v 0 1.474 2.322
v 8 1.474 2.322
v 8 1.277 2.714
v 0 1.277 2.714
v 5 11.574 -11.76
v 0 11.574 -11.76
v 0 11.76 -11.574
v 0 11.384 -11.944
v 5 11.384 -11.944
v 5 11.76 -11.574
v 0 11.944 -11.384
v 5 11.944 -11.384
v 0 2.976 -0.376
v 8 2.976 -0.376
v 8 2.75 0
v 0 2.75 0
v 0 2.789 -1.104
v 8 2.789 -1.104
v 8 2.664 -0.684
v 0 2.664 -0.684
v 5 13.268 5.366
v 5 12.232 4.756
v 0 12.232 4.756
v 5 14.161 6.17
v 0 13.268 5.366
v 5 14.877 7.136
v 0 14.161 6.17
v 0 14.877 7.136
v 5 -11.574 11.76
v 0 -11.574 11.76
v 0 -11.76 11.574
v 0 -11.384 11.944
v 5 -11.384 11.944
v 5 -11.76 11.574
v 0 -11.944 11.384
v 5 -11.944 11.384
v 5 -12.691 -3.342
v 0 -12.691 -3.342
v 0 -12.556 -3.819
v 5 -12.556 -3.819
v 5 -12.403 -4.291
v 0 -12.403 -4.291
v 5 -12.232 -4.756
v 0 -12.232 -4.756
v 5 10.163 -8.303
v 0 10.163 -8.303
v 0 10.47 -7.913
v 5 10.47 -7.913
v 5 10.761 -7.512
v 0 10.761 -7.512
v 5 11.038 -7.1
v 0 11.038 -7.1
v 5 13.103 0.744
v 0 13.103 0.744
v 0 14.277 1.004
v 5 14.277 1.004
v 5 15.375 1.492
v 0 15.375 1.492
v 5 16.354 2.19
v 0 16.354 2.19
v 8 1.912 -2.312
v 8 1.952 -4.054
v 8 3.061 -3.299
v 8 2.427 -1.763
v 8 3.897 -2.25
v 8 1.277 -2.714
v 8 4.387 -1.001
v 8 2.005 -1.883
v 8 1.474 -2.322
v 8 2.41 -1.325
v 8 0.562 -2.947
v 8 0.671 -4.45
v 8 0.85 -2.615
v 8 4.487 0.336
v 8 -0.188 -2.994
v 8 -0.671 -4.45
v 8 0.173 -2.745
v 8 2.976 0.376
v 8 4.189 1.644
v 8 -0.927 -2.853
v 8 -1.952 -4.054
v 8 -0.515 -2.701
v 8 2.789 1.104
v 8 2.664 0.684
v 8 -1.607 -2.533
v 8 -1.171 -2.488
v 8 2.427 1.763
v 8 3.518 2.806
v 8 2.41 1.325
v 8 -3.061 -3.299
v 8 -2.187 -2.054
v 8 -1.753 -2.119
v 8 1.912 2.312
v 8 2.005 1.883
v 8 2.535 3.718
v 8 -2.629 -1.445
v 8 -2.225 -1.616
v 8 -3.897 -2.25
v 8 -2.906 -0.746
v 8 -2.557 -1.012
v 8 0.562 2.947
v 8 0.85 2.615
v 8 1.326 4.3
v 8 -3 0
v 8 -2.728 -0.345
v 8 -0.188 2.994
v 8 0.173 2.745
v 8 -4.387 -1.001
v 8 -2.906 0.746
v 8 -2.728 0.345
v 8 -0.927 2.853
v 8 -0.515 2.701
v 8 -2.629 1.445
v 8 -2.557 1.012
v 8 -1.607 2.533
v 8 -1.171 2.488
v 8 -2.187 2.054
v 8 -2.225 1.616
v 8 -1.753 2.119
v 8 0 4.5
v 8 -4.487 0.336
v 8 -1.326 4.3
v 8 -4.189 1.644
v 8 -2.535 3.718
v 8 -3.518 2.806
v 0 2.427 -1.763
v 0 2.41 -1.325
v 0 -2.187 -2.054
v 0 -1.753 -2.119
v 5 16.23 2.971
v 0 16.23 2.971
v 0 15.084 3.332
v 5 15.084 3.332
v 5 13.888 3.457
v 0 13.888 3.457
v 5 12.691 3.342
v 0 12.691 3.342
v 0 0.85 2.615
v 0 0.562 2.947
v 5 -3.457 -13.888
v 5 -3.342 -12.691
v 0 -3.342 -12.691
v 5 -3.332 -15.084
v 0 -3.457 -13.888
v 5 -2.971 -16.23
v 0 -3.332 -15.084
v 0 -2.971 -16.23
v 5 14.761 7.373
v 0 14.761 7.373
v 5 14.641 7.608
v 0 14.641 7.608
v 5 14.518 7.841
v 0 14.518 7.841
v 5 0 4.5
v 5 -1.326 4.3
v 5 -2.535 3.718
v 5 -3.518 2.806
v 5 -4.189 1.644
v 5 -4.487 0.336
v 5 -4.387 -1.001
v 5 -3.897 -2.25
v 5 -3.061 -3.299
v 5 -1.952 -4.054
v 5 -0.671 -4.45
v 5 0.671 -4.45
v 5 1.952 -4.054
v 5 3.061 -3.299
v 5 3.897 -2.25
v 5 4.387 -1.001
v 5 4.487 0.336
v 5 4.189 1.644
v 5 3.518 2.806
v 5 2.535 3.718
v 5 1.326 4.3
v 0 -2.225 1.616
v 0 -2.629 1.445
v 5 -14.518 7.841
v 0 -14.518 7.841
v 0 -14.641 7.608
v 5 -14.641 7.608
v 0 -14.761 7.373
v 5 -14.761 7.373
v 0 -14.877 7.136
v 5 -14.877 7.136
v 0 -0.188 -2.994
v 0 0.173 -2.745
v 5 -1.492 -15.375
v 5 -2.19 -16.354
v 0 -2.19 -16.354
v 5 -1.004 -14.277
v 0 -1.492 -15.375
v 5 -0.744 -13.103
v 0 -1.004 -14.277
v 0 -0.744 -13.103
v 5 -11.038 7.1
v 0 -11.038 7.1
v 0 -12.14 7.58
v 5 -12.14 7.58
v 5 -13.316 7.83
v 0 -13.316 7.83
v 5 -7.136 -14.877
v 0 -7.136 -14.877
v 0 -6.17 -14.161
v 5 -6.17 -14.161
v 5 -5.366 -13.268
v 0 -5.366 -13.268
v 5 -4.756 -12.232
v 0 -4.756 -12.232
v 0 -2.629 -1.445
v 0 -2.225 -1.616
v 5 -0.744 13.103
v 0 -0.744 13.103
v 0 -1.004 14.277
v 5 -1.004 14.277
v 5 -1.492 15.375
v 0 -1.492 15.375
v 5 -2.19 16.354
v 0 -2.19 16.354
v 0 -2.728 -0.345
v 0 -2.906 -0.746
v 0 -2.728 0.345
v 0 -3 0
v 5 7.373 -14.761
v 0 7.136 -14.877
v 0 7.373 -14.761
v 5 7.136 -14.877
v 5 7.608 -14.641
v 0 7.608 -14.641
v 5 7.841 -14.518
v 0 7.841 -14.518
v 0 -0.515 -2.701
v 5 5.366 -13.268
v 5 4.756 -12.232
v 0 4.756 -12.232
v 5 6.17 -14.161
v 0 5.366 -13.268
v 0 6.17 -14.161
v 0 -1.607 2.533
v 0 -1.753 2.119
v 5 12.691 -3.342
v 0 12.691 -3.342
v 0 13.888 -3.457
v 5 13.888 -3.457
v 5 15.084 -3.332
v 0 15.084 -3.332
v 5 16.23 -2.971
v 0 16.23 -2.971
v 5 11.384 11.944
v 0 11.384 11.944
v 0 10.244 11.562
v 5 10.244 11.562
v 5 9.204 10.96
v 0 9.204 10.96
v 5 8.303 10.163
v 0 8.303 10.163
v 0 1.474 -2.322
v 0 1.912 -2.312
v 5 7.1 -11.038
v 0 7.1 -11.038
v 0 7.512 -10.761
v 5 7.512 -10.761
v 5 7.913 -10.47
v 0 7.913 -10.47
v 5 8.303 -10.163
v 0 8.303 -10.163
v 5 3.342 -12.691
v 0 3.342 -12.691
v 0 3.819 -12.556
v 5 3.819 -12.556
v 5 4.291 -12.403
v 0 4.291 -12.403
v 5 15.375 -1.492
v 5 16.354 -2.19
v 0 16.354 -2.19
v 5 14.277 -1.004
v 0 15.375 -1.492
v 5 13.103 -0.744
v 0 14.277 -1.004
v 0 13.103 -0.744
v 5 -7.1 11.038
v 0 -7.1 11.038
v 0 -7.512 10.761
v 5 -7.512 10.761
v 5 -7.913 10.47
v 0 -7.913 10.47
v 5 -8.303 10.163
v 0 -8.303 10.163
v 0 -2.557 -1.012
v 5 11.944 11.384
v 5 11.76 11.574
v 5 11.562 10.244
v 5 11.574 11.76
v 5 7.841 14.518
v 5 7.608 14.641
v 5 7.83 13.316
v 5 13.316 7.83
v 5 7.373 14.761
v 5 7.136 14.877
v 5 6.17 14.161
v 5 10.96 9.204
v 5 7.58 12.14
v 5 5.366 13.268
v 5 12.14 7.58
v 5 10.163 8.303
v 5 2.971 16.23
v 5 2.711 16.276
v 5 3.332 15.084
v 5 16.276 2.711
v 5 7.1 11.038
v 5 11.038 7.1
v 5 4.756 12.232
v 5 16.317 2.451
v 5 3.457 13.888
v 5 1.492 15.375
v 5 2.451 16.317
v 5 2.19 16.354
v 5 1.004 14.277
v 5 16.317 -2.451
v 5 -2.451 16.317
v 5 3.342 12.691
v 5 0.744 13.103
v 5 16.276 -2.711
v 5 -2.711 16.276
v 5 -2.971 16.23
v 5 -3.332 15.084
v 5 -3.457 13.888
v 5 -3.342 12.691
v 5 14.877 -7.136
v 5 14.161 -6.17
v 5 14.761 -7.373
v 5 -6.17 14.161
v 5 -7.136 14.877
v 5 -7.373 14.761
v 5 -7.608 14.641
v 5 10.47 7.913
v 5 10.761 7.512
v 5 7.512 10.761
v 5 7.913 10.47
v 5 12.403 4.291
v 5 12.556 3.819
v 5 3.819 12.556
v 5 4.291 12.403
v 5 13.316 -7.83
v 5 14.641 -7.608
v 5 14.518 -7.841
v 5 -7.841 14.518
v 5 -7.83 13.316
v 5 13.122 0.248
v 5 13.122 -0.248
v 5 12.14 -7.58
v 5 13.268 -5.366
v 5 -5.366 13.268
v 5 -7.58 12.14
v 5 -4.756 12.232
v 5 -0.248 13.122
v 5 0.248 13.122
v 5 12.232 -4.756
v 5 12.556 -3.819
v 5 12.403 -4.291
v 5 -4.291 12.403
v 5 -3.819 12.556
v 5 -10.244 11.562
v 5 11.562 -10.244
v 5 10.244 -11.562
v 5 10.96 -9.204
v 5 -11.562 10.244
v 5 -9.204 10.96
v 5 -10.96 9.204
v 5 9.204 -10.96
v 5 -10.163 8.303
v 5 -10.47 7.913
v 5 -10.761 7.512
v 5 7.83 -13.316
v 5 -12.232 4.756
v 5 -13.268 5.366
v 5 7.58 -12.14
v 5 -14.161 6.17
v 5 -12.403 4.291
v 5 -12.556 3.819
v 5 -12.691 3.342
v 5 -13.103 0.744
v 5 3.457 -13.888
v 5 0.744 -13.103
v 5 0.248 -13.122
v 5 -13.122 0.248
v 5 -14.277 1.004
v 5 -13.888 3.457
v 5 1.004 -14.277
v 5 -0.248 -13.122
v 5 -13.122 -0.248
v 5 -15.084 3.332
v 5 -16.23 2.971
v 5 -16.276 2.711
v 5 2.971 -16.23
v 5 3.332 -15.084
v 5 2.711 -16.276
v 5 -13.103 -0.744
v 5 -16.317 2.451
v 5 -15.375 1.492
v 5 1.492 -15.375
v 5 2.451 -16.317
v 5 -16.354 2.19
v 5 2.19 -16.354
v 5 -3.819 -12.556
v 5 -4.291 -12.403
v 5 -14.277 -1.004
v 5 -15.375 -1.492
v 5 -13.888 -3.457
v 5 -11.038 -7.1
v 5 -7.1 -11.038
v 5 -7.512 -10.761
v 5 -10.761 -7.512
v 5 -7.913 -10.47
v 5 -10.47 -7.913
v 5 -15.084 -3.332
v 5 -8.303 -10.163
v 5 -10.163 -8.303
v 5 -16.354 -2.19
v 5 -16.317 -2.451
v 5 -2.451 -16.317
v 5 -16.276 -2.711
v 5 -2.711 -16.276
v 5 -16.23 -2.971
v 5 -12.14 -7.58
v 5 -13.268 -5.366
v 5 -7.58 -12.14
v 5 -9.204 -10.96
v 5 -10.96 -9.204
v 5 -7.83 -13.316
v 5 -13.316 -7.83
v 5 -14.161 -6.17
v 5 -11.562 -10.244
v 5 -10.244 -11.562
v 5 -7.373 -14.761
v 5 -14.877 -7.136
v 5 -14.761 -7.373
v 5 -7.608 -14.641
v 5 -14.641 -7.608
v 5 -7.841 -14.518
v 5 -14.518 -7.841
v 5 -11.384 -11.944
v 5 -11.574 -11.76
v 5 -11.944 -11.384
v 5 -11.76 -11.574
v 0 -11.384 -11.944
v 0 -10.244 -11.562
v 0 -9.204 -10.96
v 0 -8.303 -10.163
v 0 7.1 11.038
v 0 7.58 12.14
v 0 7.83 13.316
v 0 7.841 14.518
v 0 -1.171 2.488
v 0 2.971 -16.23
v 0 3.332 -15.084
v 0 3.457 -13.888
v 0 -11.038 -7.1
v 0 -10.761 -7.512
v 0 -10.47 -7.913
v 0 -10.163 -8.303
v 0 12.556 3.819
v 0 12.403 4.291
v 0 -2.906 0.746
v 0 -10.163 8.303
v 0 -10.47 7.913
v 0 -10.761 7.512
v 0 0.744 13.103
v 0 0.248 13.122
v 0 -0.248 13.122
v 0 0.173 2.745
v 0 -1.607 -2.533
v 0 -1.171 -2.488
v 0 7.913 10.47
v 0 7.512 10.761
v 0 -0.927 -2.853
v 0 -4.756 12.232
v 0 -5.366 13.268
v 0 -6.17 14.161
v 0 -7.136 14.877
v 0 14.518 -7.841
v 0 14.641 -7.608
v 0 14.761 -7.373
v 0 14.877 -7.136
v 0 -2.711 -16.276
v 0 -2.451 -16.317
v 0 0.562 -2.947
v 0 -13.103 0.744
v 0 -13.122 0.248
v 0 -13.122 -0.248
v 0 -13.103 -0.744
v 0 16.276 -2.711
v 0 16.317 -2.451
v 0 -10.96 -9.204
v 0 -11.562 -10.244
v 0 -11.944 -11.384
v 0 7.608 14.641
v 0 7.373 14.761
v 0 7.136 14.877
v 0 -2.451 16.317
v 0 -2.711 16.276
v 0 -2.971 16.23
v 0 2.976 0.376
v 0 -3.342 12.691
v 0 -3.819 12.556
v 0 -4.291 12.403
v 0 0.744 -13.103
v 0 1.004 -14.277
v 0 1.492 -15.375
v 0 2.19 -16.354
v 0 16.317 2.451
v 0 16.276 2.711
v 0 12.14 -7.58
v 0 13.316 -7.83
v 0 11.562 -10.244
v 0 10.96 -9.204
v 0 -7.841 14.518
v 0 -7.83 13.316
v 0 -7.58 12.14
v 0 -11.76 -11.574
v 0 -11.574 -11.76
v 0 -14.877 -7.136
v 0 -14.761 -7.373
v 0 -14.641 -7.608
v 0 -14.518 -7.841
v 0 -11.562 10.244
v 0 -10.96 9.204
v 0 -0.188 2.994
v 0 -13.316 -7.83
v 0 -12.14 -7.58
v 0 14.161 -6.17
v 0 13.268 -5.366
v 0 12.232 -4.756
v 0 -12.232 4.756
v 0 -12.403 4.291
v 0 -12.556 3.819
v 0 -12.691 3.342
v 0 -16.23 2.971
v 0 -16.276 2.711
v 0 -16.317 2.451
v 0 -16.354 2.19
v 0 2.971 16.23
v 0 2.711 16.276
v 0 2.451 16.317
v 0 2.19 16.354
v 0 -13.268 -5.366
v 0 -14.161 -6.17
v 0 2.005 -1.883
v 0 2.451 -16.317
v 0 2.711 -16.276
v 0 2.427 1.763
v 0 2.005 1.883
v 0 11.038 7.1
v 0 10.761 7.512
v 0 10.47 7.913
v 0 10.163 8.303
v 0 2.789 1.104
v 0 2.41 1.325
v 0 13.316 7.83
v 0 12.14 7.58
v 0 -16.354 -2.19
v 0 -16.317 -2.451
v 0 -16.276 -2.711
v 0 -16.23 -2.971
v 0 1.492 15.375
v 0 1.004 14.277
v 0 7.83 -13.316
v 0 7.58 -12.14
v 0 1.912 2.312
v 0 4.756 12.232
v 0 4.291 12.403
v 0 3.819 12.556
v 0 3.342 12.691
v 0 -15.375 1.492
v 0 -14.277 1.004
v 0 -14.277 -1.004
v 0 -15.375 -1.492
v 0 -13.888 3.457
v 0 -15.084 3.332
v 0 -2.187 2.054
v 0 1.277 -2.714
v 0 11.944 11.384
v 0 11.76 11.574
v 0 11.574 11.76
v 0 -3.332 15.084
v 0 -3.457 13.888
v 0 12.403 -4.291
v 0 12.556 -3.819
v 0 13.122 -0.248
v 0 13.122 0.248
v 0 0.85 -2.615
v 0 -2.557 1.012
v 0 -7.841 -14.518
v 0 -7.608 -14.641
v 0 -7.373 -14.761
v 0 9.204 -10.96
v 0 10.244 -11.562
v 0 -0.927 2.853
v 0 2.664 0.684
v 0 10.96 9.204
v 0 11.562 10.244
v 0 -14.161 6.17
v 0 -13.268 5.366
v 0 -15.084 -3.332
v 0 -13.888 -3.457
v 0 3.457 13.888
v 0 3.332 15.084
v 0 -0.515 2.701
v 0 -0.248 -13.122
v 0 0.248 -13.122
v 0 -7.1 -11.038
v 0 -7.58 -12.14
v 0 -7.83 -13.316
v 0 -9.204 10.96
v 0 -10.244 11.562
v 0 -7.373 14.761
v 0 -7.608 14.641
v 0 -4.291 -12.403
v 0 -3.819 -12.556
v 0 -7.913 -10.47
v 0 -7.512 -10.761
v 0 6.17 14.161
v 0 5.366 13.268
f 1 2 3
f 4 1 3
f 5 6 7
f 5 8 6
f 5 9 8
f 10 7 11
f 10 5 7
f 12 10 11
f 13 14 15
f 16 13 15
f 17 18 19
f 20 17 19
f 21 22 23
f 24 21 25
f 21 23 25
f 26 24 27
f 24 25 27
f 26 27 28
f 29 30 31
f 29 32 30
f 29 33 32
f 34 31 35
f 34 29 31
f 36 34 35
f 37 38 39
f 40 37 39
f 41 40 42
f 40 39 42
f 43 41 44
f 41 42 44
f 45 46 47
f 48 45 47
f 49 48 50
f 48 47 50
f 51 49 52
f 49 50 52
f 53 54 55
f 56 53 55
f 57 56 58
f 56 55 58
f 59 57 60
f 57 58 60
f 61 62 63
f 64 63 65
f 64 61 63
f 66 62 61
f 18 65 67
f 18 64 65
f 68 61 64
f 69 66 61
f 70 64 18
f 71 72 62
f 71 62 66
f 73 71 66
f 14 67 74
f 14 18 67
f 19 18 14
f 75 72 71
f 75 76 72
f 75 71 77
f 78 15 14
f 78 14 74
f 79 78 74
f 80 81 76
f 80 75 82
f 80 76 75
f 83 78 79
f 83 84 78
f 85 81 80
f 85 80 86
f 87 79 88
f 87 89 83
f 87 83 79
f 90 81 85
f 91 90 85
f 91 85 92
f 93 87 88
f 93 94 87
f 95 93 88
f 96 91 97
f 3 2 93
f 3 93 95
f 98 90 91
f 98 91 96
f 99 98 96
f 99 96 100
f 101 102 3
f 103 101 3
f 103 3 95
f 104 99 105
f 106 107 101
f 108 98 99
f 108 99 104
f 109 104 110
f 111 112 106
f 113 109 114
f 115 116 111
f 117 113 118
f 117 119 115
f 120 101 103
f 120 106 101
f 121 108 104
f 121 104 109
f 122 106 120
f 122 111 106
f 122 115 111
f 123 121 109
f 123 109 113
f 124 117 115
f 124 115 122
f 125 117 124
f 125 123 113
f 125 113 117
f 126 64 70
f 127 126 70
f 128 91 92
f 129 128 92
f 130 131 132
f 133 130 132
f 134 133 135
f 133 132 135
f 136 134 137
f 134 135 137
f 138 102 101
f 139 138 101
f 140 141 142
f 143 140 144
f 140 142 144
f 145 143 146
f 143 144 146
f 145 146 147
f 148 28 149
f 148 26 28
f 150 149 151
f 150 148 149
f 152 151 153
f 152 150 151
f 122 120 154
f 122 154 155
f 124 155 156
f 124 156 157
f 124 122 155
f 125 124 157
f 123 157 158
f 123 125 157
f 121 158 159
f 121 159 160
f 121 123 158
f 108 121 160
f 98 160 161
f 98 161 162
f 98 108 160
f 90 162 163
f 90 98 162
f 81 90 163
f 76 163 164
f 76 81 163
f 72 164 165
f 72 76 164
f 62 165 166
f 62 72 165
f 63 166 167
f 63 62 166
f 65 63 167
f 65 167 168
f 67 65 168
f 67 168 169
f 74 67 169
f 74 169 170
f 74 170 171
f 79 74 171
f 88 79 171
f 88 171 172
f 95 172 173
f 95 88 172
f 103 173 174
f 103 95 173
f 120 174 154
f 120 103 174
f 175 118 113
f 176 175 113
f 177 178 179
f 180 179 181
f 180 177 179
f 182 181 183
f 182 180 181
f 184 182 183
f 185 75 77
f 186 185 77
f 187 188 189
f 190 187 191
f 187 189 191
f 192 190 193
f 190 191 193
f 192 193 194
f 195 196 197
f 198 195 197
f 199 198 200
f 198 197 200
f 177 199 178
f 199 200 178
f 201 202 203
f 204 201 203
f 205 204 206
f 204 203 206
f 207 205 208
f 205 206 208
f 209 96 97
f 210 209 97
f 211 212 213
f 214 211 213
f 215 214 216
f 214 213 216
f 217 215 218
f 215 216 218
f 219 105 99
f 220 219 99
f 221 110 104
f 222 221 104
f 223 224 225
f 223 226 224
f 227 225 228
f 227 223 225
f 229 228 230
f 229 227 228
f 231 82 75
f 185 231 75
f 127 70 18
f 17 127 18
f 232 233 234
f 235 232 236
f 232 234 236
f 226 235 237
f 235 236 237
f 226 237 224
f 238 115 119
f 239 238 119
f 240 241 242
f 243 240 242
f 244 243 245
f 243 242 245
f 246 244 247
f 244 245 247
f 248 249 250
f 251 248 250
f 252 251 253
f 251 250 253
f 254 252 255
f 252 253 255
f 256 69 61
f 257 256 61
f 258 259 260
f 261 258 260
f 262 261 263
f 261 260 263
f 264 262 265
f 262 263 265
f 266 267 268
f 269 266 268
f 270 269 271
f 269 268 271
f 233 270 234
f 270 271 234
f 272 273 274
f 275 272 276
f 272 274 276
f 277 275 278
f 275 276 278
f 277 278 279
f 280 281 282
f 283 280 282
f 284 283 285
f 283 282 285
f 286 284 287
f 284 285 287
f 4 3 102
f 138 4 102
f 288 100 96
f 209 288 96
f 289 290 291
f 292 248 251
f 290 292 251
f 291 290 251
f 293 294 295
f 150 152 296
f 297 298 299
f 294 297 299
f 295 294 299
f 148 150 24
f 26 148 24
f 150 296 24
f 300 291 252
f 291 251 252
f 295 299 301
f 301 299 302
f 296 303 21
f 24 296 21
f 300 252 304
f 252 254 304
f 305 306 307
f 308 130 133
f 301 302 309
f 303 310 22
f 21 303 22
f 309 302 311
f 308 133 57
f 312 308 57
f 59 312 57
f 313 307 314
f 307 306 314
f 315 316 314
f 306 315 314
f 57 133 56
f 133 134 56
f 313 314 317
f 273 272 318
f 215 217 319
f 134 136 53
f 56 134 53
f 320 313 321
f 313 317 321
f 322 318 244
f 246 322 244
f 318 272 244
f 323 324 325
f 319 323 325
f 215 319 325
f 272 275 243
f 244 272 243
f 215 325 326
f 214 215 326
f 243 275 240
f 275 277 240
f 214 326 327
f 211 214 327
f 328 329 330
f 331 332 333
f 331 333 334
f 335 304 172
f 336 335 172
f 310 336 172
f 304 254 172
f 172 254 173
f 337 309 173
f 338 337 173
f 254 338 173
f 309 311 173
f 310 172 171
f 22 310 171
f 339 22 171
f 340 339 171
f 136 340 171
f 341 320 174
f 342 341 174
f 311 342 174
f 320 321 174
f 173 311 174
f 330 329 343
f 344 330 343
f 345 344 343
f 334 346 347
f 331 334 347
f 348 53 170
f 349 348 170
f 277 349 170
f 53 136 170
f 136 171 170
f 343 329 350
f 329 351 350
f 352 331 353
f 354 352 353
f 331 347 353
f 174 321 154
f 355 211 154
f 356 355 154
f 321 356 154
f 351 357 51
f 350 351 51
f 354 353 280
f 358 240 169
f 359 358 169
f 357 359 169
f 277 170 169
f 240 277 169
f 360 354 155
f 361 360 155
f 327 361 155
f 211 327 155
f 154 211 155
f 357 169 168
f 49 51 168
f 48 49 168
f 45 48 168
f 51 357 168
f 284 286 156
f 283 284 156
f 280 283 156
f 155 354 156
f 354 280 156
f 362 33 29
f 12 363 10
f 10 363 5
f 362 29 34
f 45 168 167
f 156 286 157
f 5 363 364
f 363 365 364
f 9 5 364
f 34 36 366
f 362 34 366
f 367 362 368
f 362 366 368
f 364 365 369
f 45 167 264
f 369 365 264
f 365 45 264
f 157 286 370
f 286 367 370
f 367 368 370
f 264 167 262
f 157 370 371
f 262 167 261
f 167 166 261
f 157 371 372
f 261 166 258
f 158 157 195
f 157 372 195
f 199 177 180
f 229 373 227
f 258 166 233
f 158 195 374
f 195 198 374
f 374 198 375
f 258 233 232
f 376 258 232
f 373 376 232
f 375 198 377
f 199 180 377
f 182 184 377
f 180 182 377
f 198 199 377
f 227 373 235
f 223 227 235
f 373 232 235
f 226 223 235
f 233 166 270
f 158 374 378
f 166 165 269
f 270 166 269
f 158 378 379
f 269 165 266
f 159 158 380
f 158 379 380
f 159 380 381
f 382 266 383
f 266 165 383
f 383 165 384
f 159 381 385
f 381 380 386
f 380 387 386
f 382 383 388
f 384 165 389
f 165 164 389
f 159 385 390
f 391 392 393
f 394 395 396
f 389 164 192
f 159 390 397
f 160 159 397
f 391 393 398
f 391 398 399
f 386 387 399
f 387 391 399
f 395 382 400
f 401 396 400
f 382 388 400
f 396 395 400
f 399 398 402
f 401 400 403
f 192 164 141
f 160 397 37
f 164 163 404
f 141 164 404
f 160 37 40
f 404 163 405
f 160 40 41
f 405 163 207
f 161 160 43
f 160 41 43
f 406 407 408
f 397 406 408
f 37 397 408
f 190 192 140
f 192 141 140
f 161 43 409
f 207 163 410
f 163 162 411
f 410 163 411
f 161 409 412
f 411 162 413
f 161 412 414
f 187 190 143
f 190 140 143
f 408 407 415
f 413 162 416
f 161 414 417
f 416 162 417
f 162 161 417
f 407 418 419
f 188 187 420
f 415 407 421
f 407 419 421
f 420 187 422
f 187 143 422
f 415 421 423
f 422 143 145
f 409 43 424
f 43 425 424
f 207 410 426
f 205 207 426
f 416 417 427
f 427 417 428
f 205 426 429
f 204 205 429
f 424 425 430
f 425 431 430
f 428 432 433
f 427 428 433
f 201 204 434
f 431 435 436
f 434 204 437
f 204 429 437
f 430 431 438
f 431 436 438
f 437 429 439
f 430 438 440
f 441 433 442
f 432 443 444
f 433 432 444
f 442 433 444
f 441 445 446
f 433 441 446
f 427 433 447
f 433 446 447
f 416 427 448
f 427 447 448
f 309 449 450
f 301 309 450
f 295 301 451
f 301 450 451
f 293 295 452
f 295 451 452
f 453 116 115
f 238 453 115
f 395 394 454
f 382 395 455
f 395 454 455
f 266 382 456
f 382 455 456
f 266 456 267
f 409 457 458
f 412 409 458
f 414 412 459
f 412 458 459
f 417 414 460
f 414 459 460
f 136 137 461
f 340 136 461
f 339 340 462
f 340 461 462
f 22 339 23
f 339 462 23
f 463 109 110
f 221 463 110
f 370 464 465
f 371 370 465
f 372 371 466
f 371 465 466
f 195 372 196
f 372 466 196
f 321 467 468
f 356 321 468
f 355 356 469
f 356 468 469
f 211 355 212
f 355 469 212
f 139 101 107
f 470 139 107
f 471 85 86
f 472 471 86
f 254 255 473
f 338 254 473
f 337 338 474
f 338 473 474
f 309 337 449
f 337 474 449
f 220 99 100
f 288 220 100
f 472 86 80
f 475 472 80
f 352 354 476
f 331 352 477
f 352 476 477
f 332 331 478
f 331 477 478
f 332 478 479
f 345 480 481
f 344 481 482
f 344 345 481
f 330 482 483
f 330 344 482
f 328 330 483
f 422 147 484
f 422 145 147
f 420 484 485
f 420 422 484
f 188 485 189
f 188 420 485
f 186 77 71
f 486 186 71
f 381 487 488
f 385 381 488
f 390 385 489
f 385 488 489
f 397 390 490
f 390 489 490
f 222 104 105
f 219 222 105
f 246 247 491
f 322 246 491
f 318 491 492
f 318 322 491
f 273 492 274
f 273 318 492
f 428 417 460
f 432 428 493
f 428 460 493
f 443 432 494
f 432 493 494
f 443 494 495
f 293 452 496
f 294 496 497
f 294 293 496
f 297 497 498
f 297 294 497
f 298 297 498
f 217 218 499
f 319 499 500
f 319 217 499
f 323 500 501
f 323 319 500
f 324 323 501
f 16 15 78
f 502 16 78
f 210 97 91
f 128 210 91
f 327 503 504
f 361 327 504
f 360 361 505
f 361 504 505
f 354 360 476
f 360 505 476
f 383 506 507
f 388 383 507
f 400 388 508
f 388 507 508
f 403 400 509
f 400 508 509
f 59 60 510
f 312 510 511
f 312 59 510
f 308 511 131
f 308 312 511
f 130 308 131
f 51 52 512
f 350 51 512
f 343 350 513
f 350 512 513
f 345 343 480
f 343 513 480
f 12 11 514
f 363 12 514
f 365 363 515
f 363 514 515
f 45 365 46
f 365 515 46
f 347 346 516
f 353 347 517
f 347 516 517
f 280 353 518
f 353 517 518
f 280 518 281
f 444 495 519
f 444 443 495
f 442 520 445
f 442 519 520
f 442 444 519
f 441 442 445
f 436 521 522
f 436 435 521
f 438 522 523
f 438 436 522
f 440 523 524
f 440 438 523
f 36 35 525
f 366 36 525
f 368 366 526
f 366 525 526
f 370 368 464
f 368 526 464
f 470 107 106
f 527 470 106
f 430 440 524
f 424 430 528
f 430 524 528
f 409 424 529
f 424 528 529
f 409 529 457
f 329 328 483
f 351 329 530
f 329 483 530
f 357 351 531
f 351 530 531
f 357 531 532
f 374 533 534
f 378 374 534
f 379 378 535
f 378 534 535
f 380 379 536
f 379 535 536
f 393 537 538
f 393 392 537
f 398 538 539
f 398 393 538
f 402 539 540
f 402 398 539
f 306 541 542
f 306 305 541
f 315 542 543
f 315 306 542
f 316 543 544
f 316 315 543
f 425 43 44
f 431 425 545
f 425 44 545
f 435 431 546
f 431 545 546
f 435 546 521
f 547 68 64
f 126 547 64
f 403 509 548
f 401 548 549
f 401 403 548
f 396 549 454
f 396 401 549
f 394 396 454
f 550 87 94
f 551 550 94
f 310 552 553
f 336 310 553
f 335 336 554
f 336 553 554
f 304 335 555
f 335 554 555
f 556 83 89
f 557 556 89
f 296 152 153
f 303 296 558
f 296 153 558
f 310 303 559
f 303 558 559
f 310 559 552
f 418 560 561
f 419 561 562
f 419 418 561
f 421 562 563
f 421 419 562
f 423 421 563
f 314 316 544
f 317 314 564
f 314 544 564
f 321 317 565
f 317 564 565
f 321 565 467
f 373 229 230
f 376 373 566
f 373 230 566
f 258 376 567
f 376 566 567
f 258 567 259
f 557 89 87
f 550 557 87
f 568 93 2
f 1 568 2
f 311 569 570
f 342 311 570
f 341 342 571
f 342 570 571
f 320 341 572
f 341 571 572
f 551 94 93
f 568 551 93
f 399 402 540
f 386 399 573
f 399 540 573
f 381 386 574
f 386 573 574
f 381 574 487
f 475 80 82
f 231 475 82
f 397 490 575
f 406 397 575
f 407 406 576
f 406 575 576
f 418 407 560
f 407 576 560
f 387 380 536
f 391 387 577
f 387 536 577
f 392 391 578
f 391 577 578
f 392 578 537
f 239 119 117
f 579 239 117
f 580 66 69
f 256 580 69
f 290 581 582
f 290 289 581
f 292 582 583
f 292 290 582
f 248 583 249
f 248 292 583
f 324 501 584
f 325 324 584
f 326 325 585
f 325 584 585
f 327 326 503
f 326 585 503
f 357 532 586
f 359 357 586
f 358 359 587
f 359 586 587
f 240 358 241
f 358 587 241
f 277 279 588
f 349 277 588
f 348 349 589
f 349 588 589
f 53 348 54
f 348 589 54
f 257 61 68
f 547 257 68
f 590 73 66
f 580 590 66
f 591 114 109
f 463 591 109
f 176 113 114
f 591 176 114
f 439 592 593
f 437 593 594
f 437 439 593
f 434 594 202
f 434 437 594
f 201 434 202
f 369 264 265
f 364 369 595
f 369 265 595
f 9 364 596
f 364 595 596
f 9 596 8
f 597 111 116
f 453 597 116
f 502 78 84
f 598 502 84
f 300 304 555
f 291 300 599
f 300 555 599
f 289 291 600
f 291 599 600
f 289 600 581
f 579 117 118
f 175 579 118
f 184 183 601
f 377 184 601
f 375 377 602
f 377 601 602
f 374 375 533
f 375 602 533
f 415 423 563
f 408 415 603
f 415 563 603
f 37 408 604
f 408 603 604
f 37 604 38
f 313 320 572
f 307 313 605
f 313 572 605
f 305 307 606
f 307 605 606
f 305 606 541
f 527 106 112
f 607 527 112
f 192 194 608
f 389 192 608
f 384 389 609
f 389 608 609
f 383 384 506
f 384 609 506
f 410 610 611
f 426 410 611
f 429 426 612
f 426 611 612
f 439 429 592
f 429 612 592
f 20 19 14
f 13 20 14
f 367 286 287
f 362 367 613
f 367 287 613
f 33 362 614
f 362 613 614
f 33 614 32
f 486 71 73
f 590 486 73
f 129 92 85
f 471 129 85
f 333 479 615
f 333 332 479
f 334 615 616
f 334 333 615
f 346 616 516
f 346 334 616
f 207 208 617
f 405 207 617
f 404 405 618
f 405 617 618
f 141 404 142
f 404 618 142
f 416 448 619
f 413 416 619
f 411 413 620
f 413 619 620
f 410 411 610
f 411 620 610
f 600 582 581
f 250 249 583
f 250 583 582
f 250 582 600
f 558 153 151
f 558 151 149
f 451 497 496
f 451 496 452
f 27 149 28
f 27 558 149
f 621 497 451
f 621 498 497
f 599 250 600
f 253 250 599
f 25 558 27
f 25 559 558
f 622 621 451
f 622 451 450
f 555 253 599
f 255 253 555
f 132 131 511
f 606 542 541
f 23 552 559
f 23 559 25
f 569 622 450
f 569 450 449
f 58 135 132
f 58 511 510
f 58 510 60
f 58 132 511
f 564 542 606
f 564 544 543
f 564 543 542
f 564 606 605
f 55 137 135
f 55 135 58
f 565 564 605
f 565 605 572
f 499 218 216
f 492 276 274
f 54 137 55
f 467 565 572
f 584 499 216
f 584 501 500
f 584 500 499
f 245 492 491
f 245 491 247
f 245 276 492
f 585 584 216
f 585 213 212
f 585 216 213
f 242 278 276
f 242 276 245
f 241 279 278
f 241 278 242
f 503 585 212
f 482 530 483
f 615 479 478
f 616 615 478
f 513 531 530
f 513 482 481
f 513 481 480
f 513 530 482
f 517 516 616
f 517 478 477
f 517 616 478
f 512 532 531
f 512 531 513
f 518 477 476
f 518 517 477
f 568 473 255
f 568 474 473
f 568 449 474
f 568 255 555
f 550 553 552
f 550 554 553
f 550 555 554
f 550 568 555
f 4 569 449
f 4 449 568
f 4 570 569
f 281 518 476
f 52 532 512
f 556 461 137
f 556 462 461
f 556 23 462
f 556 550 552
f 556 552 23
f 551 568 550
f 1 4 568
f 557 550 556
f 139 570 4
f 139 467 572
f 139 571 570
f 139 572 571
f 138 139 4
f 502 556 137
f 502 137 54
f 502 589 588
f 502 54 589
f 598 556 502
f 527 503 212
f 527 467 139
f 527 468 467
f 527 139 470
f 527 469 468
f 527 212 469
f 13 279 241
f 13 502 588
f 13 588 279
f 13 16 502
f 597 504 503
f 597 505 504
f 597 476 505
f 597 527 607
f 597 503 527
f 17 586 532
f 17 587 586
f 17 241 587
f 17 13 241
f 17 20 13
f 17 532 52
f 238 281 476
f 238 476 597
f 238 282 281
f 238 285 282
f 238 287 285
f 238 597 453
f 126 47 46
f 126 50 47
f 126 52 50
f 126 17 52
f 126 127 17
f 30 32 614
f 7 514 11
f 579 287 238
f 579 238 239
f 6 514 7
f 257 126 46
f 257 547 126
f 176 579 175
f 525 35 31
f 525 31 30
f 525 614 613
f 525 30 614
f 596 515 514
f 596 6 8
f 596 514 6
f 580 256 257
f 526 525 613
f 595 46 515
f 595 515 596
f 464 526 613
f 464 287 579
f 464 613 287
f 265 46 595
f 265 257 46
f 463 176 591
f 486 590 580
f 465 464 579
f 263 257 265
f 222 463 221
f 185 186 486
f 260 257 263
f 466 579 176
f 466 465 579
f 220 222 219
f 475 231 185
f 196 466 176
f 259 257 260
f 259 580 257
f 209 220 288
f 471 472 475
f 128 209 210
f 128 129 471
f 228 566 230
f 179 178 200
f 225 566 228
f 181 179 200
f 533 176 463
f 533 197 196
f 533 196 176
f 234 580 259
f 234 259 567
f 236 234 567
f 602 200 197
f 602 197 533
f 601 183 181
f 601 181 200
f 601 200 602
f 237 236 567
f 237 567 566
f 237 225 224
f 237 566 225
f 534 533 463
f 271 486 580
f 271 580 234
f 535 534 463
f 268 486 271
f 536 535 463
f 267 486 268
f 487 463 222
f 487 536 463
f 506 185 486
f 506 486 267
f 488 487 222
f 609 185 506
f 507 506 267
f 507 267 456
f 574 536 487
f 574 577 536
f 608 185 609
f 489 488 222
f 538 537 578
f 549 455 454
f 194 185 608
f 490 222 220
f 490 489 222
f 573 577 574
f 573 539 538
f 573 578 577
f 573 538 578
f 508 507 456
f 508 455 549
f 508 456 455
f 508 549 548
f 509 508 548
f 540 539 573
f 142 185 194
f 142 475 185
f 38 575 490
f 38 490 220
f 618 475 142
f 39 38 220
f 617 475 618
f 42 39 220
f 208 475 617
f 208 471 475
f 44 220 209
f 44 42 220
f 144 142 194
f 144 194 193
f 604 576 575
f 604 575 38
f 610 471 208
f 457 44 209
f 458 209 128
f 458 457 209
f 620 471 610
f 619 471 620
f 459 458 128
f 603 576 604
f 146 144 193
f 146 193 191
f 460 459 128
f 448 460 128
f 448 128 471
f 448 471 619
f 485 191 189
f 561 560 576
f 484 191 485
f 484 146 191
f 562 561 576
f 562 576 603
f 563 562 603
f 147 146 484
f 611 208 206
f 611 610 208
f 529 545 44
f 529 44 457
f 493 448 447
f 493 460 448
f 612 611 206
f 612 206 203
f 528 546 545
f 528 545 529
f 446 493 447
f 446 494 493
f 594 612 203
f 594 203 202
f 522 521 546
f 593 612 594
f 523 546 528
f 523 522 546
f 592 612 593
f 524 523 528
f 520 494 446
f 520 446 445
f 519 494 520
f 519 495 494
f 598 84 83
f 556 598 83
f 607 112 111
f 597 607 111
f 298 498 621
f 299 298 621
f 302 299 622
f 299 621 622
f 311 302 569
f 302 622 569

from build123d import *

# Parameters (mm, degrees)
BASPROSKE_W         = 5
BASPROSKE_H         = 16.5
TOOTHCUT_DEPTH      = 24.864199128
TEETHCUTS_COUNT     = 20
TEETHCUTS_ANGLE     = 342
BORSKE_R            = 2.5
BORE_DEPTH          = 50.0000508
BOSS_EXTRUDE1_START = 3
SKETCH1_R           = 4.5
SKETCH1_R_2         = 2.5
BOSS_EXTRUDE1_DEPTH = 3
SKETCH2_R           = 2.75
SKETCH2_R_2         = 2.5
CUT_EXTRUDE1_DEPTH  = 25.472631648
CIRPATTERN1_COUNT   = 25


with BuildPart() as part:
    # BasProSke → Base-Revolve (revolve)
    with BuildSketch(Plane(origin=(0, 0, 0), x_dir=(1, 0, 0), z_dir=(0, 1, 0)), mode=Mode.PRIVATE) as base_revolve_sk:
        with Locations((2.5, 8.25)):
            Rectangle(BASPROSKE_W, BASPROSKE_H)
    revolve(base_revolve_sk.sketch.rotate(Axis((-10, 0, 0), (1, 0, 0)), 180), axis=Axis((-10, 0, 0), (1, 0, 0)))

    # TooCutSke → ToothCut (cut, through all)
    with BuildSketch(Plane(origin=(0, 0, 0), x_dir=(0, 0, -1), z_dir=(1, 0, 0))):
        with BuildLine():
            ThreePointArc((0.74381438, 13.102904875), (0, 13.124), (-0.74381438, 13.102904875))
            ThreePointArc((-0.74381438, 13.102904875), (-1.226473103, 14.852072512), (-2.209965745, 16.376962373))
            ThreePointArc((-2.209965745, 16.376962373), (0, 16.5254), (2.209965745, 16.376962373))
            ThreePointArc((2.209965745, 16.376962373), (1.226473103, 14.852072512), (0.74381438, 13.102904875))
        make_face()
    toothcut = extrude(amount=TOOTHCUT_DEPTH, mode=Mode.SUBTRACT)

    # TeethCuts: ToothCut ×20 about axis
    teethcuts_axis = Axis((-10, 0, 0), (1, 0, 0))
    for i in range(1, TEETHCUTS_COUNT):
        add(toothcut.rotate(teethcuts_axis, i * TEETHCUTS_ANGLE / (TEETHCUTS_COUNT - 1)), mode=Mode.SUBTRACT)

    # BorSke → Bore (cut, symmetric)
    with BuildSketch(Plane(origin=(0, 0, 0), x_dir=(0, 0, -1), z_dir=(1, 0, 0))):
        with Locations(Location((0, 0, 0), (0, 0, 180))):
            Circle(BORSKE_R)
    extrude(amount=BORE_DEPTH, both=True, mode=Mode.SUBTRACT)

    # Sketch1 → Boss-Extrude1 (add)
    with BuildSketch(Plane(origin=(5, 0, 0), x_dir=(0, 0, -1), z_dir=(1, 0, 0)).offset(BOSS_EXTRUDE1_START)):
        with Locations(Location((0, 0, 0), (0, 0, 180))):
            Circle(SKETCH1_R)
        Circle(SKETCH1_R_2, mode=Mode.SUBTRACT)
    extrude(amount=-BOSS_EXTRUDE1_DEPTH)

    # Sketch2 → Cut-Extrude1 (cut, through all)
    # profile 1 of 2: a face of its own
    with BuildSketch(Plane(origin=(8, 0, 0), x_dir=(0, 0, -1), z_dir=(1, 0, 0))):
        with BuildLine():
            ThreePointArc((0.344666392, -2.728315429), (0, -2.75), (-0.344666392, -2.728315429))
            Line((-0.344666392, -2.728315429), (0, -3))
            Line((0, -3), (0.344666392, -2.728315429))
        make_face()
    # profile 2 of 2: a face of its own
    with BuildSketch(Plane(origin=(8, 0, 0), x_dir=(0, 0, -1), z_dir=(1, 0, 0))):
        Circle(SKETCH2_R)
        Circle(SKETCH2_R_2, mode=Mode.SUBTRACT)
    cut_extrude1 = extrude(amount=-CUT_EXTRUDE1_DEPTH, mode=Mode.SUBTRACT)

    # CirPattern1: Cut-Extrude1 ×25 about axis
    cirpattern1_axis = Axis((0, 0, 0), (1, 0, 0))
    for i in range(1, CIRPATTERN1_COUNT):
        add(cut_extrude1.rotate(cirpattern1_axis, i * 360 / CIRPATTERN1_COUNT), mode=Mode.SUBTRACT)


solid = part.part
